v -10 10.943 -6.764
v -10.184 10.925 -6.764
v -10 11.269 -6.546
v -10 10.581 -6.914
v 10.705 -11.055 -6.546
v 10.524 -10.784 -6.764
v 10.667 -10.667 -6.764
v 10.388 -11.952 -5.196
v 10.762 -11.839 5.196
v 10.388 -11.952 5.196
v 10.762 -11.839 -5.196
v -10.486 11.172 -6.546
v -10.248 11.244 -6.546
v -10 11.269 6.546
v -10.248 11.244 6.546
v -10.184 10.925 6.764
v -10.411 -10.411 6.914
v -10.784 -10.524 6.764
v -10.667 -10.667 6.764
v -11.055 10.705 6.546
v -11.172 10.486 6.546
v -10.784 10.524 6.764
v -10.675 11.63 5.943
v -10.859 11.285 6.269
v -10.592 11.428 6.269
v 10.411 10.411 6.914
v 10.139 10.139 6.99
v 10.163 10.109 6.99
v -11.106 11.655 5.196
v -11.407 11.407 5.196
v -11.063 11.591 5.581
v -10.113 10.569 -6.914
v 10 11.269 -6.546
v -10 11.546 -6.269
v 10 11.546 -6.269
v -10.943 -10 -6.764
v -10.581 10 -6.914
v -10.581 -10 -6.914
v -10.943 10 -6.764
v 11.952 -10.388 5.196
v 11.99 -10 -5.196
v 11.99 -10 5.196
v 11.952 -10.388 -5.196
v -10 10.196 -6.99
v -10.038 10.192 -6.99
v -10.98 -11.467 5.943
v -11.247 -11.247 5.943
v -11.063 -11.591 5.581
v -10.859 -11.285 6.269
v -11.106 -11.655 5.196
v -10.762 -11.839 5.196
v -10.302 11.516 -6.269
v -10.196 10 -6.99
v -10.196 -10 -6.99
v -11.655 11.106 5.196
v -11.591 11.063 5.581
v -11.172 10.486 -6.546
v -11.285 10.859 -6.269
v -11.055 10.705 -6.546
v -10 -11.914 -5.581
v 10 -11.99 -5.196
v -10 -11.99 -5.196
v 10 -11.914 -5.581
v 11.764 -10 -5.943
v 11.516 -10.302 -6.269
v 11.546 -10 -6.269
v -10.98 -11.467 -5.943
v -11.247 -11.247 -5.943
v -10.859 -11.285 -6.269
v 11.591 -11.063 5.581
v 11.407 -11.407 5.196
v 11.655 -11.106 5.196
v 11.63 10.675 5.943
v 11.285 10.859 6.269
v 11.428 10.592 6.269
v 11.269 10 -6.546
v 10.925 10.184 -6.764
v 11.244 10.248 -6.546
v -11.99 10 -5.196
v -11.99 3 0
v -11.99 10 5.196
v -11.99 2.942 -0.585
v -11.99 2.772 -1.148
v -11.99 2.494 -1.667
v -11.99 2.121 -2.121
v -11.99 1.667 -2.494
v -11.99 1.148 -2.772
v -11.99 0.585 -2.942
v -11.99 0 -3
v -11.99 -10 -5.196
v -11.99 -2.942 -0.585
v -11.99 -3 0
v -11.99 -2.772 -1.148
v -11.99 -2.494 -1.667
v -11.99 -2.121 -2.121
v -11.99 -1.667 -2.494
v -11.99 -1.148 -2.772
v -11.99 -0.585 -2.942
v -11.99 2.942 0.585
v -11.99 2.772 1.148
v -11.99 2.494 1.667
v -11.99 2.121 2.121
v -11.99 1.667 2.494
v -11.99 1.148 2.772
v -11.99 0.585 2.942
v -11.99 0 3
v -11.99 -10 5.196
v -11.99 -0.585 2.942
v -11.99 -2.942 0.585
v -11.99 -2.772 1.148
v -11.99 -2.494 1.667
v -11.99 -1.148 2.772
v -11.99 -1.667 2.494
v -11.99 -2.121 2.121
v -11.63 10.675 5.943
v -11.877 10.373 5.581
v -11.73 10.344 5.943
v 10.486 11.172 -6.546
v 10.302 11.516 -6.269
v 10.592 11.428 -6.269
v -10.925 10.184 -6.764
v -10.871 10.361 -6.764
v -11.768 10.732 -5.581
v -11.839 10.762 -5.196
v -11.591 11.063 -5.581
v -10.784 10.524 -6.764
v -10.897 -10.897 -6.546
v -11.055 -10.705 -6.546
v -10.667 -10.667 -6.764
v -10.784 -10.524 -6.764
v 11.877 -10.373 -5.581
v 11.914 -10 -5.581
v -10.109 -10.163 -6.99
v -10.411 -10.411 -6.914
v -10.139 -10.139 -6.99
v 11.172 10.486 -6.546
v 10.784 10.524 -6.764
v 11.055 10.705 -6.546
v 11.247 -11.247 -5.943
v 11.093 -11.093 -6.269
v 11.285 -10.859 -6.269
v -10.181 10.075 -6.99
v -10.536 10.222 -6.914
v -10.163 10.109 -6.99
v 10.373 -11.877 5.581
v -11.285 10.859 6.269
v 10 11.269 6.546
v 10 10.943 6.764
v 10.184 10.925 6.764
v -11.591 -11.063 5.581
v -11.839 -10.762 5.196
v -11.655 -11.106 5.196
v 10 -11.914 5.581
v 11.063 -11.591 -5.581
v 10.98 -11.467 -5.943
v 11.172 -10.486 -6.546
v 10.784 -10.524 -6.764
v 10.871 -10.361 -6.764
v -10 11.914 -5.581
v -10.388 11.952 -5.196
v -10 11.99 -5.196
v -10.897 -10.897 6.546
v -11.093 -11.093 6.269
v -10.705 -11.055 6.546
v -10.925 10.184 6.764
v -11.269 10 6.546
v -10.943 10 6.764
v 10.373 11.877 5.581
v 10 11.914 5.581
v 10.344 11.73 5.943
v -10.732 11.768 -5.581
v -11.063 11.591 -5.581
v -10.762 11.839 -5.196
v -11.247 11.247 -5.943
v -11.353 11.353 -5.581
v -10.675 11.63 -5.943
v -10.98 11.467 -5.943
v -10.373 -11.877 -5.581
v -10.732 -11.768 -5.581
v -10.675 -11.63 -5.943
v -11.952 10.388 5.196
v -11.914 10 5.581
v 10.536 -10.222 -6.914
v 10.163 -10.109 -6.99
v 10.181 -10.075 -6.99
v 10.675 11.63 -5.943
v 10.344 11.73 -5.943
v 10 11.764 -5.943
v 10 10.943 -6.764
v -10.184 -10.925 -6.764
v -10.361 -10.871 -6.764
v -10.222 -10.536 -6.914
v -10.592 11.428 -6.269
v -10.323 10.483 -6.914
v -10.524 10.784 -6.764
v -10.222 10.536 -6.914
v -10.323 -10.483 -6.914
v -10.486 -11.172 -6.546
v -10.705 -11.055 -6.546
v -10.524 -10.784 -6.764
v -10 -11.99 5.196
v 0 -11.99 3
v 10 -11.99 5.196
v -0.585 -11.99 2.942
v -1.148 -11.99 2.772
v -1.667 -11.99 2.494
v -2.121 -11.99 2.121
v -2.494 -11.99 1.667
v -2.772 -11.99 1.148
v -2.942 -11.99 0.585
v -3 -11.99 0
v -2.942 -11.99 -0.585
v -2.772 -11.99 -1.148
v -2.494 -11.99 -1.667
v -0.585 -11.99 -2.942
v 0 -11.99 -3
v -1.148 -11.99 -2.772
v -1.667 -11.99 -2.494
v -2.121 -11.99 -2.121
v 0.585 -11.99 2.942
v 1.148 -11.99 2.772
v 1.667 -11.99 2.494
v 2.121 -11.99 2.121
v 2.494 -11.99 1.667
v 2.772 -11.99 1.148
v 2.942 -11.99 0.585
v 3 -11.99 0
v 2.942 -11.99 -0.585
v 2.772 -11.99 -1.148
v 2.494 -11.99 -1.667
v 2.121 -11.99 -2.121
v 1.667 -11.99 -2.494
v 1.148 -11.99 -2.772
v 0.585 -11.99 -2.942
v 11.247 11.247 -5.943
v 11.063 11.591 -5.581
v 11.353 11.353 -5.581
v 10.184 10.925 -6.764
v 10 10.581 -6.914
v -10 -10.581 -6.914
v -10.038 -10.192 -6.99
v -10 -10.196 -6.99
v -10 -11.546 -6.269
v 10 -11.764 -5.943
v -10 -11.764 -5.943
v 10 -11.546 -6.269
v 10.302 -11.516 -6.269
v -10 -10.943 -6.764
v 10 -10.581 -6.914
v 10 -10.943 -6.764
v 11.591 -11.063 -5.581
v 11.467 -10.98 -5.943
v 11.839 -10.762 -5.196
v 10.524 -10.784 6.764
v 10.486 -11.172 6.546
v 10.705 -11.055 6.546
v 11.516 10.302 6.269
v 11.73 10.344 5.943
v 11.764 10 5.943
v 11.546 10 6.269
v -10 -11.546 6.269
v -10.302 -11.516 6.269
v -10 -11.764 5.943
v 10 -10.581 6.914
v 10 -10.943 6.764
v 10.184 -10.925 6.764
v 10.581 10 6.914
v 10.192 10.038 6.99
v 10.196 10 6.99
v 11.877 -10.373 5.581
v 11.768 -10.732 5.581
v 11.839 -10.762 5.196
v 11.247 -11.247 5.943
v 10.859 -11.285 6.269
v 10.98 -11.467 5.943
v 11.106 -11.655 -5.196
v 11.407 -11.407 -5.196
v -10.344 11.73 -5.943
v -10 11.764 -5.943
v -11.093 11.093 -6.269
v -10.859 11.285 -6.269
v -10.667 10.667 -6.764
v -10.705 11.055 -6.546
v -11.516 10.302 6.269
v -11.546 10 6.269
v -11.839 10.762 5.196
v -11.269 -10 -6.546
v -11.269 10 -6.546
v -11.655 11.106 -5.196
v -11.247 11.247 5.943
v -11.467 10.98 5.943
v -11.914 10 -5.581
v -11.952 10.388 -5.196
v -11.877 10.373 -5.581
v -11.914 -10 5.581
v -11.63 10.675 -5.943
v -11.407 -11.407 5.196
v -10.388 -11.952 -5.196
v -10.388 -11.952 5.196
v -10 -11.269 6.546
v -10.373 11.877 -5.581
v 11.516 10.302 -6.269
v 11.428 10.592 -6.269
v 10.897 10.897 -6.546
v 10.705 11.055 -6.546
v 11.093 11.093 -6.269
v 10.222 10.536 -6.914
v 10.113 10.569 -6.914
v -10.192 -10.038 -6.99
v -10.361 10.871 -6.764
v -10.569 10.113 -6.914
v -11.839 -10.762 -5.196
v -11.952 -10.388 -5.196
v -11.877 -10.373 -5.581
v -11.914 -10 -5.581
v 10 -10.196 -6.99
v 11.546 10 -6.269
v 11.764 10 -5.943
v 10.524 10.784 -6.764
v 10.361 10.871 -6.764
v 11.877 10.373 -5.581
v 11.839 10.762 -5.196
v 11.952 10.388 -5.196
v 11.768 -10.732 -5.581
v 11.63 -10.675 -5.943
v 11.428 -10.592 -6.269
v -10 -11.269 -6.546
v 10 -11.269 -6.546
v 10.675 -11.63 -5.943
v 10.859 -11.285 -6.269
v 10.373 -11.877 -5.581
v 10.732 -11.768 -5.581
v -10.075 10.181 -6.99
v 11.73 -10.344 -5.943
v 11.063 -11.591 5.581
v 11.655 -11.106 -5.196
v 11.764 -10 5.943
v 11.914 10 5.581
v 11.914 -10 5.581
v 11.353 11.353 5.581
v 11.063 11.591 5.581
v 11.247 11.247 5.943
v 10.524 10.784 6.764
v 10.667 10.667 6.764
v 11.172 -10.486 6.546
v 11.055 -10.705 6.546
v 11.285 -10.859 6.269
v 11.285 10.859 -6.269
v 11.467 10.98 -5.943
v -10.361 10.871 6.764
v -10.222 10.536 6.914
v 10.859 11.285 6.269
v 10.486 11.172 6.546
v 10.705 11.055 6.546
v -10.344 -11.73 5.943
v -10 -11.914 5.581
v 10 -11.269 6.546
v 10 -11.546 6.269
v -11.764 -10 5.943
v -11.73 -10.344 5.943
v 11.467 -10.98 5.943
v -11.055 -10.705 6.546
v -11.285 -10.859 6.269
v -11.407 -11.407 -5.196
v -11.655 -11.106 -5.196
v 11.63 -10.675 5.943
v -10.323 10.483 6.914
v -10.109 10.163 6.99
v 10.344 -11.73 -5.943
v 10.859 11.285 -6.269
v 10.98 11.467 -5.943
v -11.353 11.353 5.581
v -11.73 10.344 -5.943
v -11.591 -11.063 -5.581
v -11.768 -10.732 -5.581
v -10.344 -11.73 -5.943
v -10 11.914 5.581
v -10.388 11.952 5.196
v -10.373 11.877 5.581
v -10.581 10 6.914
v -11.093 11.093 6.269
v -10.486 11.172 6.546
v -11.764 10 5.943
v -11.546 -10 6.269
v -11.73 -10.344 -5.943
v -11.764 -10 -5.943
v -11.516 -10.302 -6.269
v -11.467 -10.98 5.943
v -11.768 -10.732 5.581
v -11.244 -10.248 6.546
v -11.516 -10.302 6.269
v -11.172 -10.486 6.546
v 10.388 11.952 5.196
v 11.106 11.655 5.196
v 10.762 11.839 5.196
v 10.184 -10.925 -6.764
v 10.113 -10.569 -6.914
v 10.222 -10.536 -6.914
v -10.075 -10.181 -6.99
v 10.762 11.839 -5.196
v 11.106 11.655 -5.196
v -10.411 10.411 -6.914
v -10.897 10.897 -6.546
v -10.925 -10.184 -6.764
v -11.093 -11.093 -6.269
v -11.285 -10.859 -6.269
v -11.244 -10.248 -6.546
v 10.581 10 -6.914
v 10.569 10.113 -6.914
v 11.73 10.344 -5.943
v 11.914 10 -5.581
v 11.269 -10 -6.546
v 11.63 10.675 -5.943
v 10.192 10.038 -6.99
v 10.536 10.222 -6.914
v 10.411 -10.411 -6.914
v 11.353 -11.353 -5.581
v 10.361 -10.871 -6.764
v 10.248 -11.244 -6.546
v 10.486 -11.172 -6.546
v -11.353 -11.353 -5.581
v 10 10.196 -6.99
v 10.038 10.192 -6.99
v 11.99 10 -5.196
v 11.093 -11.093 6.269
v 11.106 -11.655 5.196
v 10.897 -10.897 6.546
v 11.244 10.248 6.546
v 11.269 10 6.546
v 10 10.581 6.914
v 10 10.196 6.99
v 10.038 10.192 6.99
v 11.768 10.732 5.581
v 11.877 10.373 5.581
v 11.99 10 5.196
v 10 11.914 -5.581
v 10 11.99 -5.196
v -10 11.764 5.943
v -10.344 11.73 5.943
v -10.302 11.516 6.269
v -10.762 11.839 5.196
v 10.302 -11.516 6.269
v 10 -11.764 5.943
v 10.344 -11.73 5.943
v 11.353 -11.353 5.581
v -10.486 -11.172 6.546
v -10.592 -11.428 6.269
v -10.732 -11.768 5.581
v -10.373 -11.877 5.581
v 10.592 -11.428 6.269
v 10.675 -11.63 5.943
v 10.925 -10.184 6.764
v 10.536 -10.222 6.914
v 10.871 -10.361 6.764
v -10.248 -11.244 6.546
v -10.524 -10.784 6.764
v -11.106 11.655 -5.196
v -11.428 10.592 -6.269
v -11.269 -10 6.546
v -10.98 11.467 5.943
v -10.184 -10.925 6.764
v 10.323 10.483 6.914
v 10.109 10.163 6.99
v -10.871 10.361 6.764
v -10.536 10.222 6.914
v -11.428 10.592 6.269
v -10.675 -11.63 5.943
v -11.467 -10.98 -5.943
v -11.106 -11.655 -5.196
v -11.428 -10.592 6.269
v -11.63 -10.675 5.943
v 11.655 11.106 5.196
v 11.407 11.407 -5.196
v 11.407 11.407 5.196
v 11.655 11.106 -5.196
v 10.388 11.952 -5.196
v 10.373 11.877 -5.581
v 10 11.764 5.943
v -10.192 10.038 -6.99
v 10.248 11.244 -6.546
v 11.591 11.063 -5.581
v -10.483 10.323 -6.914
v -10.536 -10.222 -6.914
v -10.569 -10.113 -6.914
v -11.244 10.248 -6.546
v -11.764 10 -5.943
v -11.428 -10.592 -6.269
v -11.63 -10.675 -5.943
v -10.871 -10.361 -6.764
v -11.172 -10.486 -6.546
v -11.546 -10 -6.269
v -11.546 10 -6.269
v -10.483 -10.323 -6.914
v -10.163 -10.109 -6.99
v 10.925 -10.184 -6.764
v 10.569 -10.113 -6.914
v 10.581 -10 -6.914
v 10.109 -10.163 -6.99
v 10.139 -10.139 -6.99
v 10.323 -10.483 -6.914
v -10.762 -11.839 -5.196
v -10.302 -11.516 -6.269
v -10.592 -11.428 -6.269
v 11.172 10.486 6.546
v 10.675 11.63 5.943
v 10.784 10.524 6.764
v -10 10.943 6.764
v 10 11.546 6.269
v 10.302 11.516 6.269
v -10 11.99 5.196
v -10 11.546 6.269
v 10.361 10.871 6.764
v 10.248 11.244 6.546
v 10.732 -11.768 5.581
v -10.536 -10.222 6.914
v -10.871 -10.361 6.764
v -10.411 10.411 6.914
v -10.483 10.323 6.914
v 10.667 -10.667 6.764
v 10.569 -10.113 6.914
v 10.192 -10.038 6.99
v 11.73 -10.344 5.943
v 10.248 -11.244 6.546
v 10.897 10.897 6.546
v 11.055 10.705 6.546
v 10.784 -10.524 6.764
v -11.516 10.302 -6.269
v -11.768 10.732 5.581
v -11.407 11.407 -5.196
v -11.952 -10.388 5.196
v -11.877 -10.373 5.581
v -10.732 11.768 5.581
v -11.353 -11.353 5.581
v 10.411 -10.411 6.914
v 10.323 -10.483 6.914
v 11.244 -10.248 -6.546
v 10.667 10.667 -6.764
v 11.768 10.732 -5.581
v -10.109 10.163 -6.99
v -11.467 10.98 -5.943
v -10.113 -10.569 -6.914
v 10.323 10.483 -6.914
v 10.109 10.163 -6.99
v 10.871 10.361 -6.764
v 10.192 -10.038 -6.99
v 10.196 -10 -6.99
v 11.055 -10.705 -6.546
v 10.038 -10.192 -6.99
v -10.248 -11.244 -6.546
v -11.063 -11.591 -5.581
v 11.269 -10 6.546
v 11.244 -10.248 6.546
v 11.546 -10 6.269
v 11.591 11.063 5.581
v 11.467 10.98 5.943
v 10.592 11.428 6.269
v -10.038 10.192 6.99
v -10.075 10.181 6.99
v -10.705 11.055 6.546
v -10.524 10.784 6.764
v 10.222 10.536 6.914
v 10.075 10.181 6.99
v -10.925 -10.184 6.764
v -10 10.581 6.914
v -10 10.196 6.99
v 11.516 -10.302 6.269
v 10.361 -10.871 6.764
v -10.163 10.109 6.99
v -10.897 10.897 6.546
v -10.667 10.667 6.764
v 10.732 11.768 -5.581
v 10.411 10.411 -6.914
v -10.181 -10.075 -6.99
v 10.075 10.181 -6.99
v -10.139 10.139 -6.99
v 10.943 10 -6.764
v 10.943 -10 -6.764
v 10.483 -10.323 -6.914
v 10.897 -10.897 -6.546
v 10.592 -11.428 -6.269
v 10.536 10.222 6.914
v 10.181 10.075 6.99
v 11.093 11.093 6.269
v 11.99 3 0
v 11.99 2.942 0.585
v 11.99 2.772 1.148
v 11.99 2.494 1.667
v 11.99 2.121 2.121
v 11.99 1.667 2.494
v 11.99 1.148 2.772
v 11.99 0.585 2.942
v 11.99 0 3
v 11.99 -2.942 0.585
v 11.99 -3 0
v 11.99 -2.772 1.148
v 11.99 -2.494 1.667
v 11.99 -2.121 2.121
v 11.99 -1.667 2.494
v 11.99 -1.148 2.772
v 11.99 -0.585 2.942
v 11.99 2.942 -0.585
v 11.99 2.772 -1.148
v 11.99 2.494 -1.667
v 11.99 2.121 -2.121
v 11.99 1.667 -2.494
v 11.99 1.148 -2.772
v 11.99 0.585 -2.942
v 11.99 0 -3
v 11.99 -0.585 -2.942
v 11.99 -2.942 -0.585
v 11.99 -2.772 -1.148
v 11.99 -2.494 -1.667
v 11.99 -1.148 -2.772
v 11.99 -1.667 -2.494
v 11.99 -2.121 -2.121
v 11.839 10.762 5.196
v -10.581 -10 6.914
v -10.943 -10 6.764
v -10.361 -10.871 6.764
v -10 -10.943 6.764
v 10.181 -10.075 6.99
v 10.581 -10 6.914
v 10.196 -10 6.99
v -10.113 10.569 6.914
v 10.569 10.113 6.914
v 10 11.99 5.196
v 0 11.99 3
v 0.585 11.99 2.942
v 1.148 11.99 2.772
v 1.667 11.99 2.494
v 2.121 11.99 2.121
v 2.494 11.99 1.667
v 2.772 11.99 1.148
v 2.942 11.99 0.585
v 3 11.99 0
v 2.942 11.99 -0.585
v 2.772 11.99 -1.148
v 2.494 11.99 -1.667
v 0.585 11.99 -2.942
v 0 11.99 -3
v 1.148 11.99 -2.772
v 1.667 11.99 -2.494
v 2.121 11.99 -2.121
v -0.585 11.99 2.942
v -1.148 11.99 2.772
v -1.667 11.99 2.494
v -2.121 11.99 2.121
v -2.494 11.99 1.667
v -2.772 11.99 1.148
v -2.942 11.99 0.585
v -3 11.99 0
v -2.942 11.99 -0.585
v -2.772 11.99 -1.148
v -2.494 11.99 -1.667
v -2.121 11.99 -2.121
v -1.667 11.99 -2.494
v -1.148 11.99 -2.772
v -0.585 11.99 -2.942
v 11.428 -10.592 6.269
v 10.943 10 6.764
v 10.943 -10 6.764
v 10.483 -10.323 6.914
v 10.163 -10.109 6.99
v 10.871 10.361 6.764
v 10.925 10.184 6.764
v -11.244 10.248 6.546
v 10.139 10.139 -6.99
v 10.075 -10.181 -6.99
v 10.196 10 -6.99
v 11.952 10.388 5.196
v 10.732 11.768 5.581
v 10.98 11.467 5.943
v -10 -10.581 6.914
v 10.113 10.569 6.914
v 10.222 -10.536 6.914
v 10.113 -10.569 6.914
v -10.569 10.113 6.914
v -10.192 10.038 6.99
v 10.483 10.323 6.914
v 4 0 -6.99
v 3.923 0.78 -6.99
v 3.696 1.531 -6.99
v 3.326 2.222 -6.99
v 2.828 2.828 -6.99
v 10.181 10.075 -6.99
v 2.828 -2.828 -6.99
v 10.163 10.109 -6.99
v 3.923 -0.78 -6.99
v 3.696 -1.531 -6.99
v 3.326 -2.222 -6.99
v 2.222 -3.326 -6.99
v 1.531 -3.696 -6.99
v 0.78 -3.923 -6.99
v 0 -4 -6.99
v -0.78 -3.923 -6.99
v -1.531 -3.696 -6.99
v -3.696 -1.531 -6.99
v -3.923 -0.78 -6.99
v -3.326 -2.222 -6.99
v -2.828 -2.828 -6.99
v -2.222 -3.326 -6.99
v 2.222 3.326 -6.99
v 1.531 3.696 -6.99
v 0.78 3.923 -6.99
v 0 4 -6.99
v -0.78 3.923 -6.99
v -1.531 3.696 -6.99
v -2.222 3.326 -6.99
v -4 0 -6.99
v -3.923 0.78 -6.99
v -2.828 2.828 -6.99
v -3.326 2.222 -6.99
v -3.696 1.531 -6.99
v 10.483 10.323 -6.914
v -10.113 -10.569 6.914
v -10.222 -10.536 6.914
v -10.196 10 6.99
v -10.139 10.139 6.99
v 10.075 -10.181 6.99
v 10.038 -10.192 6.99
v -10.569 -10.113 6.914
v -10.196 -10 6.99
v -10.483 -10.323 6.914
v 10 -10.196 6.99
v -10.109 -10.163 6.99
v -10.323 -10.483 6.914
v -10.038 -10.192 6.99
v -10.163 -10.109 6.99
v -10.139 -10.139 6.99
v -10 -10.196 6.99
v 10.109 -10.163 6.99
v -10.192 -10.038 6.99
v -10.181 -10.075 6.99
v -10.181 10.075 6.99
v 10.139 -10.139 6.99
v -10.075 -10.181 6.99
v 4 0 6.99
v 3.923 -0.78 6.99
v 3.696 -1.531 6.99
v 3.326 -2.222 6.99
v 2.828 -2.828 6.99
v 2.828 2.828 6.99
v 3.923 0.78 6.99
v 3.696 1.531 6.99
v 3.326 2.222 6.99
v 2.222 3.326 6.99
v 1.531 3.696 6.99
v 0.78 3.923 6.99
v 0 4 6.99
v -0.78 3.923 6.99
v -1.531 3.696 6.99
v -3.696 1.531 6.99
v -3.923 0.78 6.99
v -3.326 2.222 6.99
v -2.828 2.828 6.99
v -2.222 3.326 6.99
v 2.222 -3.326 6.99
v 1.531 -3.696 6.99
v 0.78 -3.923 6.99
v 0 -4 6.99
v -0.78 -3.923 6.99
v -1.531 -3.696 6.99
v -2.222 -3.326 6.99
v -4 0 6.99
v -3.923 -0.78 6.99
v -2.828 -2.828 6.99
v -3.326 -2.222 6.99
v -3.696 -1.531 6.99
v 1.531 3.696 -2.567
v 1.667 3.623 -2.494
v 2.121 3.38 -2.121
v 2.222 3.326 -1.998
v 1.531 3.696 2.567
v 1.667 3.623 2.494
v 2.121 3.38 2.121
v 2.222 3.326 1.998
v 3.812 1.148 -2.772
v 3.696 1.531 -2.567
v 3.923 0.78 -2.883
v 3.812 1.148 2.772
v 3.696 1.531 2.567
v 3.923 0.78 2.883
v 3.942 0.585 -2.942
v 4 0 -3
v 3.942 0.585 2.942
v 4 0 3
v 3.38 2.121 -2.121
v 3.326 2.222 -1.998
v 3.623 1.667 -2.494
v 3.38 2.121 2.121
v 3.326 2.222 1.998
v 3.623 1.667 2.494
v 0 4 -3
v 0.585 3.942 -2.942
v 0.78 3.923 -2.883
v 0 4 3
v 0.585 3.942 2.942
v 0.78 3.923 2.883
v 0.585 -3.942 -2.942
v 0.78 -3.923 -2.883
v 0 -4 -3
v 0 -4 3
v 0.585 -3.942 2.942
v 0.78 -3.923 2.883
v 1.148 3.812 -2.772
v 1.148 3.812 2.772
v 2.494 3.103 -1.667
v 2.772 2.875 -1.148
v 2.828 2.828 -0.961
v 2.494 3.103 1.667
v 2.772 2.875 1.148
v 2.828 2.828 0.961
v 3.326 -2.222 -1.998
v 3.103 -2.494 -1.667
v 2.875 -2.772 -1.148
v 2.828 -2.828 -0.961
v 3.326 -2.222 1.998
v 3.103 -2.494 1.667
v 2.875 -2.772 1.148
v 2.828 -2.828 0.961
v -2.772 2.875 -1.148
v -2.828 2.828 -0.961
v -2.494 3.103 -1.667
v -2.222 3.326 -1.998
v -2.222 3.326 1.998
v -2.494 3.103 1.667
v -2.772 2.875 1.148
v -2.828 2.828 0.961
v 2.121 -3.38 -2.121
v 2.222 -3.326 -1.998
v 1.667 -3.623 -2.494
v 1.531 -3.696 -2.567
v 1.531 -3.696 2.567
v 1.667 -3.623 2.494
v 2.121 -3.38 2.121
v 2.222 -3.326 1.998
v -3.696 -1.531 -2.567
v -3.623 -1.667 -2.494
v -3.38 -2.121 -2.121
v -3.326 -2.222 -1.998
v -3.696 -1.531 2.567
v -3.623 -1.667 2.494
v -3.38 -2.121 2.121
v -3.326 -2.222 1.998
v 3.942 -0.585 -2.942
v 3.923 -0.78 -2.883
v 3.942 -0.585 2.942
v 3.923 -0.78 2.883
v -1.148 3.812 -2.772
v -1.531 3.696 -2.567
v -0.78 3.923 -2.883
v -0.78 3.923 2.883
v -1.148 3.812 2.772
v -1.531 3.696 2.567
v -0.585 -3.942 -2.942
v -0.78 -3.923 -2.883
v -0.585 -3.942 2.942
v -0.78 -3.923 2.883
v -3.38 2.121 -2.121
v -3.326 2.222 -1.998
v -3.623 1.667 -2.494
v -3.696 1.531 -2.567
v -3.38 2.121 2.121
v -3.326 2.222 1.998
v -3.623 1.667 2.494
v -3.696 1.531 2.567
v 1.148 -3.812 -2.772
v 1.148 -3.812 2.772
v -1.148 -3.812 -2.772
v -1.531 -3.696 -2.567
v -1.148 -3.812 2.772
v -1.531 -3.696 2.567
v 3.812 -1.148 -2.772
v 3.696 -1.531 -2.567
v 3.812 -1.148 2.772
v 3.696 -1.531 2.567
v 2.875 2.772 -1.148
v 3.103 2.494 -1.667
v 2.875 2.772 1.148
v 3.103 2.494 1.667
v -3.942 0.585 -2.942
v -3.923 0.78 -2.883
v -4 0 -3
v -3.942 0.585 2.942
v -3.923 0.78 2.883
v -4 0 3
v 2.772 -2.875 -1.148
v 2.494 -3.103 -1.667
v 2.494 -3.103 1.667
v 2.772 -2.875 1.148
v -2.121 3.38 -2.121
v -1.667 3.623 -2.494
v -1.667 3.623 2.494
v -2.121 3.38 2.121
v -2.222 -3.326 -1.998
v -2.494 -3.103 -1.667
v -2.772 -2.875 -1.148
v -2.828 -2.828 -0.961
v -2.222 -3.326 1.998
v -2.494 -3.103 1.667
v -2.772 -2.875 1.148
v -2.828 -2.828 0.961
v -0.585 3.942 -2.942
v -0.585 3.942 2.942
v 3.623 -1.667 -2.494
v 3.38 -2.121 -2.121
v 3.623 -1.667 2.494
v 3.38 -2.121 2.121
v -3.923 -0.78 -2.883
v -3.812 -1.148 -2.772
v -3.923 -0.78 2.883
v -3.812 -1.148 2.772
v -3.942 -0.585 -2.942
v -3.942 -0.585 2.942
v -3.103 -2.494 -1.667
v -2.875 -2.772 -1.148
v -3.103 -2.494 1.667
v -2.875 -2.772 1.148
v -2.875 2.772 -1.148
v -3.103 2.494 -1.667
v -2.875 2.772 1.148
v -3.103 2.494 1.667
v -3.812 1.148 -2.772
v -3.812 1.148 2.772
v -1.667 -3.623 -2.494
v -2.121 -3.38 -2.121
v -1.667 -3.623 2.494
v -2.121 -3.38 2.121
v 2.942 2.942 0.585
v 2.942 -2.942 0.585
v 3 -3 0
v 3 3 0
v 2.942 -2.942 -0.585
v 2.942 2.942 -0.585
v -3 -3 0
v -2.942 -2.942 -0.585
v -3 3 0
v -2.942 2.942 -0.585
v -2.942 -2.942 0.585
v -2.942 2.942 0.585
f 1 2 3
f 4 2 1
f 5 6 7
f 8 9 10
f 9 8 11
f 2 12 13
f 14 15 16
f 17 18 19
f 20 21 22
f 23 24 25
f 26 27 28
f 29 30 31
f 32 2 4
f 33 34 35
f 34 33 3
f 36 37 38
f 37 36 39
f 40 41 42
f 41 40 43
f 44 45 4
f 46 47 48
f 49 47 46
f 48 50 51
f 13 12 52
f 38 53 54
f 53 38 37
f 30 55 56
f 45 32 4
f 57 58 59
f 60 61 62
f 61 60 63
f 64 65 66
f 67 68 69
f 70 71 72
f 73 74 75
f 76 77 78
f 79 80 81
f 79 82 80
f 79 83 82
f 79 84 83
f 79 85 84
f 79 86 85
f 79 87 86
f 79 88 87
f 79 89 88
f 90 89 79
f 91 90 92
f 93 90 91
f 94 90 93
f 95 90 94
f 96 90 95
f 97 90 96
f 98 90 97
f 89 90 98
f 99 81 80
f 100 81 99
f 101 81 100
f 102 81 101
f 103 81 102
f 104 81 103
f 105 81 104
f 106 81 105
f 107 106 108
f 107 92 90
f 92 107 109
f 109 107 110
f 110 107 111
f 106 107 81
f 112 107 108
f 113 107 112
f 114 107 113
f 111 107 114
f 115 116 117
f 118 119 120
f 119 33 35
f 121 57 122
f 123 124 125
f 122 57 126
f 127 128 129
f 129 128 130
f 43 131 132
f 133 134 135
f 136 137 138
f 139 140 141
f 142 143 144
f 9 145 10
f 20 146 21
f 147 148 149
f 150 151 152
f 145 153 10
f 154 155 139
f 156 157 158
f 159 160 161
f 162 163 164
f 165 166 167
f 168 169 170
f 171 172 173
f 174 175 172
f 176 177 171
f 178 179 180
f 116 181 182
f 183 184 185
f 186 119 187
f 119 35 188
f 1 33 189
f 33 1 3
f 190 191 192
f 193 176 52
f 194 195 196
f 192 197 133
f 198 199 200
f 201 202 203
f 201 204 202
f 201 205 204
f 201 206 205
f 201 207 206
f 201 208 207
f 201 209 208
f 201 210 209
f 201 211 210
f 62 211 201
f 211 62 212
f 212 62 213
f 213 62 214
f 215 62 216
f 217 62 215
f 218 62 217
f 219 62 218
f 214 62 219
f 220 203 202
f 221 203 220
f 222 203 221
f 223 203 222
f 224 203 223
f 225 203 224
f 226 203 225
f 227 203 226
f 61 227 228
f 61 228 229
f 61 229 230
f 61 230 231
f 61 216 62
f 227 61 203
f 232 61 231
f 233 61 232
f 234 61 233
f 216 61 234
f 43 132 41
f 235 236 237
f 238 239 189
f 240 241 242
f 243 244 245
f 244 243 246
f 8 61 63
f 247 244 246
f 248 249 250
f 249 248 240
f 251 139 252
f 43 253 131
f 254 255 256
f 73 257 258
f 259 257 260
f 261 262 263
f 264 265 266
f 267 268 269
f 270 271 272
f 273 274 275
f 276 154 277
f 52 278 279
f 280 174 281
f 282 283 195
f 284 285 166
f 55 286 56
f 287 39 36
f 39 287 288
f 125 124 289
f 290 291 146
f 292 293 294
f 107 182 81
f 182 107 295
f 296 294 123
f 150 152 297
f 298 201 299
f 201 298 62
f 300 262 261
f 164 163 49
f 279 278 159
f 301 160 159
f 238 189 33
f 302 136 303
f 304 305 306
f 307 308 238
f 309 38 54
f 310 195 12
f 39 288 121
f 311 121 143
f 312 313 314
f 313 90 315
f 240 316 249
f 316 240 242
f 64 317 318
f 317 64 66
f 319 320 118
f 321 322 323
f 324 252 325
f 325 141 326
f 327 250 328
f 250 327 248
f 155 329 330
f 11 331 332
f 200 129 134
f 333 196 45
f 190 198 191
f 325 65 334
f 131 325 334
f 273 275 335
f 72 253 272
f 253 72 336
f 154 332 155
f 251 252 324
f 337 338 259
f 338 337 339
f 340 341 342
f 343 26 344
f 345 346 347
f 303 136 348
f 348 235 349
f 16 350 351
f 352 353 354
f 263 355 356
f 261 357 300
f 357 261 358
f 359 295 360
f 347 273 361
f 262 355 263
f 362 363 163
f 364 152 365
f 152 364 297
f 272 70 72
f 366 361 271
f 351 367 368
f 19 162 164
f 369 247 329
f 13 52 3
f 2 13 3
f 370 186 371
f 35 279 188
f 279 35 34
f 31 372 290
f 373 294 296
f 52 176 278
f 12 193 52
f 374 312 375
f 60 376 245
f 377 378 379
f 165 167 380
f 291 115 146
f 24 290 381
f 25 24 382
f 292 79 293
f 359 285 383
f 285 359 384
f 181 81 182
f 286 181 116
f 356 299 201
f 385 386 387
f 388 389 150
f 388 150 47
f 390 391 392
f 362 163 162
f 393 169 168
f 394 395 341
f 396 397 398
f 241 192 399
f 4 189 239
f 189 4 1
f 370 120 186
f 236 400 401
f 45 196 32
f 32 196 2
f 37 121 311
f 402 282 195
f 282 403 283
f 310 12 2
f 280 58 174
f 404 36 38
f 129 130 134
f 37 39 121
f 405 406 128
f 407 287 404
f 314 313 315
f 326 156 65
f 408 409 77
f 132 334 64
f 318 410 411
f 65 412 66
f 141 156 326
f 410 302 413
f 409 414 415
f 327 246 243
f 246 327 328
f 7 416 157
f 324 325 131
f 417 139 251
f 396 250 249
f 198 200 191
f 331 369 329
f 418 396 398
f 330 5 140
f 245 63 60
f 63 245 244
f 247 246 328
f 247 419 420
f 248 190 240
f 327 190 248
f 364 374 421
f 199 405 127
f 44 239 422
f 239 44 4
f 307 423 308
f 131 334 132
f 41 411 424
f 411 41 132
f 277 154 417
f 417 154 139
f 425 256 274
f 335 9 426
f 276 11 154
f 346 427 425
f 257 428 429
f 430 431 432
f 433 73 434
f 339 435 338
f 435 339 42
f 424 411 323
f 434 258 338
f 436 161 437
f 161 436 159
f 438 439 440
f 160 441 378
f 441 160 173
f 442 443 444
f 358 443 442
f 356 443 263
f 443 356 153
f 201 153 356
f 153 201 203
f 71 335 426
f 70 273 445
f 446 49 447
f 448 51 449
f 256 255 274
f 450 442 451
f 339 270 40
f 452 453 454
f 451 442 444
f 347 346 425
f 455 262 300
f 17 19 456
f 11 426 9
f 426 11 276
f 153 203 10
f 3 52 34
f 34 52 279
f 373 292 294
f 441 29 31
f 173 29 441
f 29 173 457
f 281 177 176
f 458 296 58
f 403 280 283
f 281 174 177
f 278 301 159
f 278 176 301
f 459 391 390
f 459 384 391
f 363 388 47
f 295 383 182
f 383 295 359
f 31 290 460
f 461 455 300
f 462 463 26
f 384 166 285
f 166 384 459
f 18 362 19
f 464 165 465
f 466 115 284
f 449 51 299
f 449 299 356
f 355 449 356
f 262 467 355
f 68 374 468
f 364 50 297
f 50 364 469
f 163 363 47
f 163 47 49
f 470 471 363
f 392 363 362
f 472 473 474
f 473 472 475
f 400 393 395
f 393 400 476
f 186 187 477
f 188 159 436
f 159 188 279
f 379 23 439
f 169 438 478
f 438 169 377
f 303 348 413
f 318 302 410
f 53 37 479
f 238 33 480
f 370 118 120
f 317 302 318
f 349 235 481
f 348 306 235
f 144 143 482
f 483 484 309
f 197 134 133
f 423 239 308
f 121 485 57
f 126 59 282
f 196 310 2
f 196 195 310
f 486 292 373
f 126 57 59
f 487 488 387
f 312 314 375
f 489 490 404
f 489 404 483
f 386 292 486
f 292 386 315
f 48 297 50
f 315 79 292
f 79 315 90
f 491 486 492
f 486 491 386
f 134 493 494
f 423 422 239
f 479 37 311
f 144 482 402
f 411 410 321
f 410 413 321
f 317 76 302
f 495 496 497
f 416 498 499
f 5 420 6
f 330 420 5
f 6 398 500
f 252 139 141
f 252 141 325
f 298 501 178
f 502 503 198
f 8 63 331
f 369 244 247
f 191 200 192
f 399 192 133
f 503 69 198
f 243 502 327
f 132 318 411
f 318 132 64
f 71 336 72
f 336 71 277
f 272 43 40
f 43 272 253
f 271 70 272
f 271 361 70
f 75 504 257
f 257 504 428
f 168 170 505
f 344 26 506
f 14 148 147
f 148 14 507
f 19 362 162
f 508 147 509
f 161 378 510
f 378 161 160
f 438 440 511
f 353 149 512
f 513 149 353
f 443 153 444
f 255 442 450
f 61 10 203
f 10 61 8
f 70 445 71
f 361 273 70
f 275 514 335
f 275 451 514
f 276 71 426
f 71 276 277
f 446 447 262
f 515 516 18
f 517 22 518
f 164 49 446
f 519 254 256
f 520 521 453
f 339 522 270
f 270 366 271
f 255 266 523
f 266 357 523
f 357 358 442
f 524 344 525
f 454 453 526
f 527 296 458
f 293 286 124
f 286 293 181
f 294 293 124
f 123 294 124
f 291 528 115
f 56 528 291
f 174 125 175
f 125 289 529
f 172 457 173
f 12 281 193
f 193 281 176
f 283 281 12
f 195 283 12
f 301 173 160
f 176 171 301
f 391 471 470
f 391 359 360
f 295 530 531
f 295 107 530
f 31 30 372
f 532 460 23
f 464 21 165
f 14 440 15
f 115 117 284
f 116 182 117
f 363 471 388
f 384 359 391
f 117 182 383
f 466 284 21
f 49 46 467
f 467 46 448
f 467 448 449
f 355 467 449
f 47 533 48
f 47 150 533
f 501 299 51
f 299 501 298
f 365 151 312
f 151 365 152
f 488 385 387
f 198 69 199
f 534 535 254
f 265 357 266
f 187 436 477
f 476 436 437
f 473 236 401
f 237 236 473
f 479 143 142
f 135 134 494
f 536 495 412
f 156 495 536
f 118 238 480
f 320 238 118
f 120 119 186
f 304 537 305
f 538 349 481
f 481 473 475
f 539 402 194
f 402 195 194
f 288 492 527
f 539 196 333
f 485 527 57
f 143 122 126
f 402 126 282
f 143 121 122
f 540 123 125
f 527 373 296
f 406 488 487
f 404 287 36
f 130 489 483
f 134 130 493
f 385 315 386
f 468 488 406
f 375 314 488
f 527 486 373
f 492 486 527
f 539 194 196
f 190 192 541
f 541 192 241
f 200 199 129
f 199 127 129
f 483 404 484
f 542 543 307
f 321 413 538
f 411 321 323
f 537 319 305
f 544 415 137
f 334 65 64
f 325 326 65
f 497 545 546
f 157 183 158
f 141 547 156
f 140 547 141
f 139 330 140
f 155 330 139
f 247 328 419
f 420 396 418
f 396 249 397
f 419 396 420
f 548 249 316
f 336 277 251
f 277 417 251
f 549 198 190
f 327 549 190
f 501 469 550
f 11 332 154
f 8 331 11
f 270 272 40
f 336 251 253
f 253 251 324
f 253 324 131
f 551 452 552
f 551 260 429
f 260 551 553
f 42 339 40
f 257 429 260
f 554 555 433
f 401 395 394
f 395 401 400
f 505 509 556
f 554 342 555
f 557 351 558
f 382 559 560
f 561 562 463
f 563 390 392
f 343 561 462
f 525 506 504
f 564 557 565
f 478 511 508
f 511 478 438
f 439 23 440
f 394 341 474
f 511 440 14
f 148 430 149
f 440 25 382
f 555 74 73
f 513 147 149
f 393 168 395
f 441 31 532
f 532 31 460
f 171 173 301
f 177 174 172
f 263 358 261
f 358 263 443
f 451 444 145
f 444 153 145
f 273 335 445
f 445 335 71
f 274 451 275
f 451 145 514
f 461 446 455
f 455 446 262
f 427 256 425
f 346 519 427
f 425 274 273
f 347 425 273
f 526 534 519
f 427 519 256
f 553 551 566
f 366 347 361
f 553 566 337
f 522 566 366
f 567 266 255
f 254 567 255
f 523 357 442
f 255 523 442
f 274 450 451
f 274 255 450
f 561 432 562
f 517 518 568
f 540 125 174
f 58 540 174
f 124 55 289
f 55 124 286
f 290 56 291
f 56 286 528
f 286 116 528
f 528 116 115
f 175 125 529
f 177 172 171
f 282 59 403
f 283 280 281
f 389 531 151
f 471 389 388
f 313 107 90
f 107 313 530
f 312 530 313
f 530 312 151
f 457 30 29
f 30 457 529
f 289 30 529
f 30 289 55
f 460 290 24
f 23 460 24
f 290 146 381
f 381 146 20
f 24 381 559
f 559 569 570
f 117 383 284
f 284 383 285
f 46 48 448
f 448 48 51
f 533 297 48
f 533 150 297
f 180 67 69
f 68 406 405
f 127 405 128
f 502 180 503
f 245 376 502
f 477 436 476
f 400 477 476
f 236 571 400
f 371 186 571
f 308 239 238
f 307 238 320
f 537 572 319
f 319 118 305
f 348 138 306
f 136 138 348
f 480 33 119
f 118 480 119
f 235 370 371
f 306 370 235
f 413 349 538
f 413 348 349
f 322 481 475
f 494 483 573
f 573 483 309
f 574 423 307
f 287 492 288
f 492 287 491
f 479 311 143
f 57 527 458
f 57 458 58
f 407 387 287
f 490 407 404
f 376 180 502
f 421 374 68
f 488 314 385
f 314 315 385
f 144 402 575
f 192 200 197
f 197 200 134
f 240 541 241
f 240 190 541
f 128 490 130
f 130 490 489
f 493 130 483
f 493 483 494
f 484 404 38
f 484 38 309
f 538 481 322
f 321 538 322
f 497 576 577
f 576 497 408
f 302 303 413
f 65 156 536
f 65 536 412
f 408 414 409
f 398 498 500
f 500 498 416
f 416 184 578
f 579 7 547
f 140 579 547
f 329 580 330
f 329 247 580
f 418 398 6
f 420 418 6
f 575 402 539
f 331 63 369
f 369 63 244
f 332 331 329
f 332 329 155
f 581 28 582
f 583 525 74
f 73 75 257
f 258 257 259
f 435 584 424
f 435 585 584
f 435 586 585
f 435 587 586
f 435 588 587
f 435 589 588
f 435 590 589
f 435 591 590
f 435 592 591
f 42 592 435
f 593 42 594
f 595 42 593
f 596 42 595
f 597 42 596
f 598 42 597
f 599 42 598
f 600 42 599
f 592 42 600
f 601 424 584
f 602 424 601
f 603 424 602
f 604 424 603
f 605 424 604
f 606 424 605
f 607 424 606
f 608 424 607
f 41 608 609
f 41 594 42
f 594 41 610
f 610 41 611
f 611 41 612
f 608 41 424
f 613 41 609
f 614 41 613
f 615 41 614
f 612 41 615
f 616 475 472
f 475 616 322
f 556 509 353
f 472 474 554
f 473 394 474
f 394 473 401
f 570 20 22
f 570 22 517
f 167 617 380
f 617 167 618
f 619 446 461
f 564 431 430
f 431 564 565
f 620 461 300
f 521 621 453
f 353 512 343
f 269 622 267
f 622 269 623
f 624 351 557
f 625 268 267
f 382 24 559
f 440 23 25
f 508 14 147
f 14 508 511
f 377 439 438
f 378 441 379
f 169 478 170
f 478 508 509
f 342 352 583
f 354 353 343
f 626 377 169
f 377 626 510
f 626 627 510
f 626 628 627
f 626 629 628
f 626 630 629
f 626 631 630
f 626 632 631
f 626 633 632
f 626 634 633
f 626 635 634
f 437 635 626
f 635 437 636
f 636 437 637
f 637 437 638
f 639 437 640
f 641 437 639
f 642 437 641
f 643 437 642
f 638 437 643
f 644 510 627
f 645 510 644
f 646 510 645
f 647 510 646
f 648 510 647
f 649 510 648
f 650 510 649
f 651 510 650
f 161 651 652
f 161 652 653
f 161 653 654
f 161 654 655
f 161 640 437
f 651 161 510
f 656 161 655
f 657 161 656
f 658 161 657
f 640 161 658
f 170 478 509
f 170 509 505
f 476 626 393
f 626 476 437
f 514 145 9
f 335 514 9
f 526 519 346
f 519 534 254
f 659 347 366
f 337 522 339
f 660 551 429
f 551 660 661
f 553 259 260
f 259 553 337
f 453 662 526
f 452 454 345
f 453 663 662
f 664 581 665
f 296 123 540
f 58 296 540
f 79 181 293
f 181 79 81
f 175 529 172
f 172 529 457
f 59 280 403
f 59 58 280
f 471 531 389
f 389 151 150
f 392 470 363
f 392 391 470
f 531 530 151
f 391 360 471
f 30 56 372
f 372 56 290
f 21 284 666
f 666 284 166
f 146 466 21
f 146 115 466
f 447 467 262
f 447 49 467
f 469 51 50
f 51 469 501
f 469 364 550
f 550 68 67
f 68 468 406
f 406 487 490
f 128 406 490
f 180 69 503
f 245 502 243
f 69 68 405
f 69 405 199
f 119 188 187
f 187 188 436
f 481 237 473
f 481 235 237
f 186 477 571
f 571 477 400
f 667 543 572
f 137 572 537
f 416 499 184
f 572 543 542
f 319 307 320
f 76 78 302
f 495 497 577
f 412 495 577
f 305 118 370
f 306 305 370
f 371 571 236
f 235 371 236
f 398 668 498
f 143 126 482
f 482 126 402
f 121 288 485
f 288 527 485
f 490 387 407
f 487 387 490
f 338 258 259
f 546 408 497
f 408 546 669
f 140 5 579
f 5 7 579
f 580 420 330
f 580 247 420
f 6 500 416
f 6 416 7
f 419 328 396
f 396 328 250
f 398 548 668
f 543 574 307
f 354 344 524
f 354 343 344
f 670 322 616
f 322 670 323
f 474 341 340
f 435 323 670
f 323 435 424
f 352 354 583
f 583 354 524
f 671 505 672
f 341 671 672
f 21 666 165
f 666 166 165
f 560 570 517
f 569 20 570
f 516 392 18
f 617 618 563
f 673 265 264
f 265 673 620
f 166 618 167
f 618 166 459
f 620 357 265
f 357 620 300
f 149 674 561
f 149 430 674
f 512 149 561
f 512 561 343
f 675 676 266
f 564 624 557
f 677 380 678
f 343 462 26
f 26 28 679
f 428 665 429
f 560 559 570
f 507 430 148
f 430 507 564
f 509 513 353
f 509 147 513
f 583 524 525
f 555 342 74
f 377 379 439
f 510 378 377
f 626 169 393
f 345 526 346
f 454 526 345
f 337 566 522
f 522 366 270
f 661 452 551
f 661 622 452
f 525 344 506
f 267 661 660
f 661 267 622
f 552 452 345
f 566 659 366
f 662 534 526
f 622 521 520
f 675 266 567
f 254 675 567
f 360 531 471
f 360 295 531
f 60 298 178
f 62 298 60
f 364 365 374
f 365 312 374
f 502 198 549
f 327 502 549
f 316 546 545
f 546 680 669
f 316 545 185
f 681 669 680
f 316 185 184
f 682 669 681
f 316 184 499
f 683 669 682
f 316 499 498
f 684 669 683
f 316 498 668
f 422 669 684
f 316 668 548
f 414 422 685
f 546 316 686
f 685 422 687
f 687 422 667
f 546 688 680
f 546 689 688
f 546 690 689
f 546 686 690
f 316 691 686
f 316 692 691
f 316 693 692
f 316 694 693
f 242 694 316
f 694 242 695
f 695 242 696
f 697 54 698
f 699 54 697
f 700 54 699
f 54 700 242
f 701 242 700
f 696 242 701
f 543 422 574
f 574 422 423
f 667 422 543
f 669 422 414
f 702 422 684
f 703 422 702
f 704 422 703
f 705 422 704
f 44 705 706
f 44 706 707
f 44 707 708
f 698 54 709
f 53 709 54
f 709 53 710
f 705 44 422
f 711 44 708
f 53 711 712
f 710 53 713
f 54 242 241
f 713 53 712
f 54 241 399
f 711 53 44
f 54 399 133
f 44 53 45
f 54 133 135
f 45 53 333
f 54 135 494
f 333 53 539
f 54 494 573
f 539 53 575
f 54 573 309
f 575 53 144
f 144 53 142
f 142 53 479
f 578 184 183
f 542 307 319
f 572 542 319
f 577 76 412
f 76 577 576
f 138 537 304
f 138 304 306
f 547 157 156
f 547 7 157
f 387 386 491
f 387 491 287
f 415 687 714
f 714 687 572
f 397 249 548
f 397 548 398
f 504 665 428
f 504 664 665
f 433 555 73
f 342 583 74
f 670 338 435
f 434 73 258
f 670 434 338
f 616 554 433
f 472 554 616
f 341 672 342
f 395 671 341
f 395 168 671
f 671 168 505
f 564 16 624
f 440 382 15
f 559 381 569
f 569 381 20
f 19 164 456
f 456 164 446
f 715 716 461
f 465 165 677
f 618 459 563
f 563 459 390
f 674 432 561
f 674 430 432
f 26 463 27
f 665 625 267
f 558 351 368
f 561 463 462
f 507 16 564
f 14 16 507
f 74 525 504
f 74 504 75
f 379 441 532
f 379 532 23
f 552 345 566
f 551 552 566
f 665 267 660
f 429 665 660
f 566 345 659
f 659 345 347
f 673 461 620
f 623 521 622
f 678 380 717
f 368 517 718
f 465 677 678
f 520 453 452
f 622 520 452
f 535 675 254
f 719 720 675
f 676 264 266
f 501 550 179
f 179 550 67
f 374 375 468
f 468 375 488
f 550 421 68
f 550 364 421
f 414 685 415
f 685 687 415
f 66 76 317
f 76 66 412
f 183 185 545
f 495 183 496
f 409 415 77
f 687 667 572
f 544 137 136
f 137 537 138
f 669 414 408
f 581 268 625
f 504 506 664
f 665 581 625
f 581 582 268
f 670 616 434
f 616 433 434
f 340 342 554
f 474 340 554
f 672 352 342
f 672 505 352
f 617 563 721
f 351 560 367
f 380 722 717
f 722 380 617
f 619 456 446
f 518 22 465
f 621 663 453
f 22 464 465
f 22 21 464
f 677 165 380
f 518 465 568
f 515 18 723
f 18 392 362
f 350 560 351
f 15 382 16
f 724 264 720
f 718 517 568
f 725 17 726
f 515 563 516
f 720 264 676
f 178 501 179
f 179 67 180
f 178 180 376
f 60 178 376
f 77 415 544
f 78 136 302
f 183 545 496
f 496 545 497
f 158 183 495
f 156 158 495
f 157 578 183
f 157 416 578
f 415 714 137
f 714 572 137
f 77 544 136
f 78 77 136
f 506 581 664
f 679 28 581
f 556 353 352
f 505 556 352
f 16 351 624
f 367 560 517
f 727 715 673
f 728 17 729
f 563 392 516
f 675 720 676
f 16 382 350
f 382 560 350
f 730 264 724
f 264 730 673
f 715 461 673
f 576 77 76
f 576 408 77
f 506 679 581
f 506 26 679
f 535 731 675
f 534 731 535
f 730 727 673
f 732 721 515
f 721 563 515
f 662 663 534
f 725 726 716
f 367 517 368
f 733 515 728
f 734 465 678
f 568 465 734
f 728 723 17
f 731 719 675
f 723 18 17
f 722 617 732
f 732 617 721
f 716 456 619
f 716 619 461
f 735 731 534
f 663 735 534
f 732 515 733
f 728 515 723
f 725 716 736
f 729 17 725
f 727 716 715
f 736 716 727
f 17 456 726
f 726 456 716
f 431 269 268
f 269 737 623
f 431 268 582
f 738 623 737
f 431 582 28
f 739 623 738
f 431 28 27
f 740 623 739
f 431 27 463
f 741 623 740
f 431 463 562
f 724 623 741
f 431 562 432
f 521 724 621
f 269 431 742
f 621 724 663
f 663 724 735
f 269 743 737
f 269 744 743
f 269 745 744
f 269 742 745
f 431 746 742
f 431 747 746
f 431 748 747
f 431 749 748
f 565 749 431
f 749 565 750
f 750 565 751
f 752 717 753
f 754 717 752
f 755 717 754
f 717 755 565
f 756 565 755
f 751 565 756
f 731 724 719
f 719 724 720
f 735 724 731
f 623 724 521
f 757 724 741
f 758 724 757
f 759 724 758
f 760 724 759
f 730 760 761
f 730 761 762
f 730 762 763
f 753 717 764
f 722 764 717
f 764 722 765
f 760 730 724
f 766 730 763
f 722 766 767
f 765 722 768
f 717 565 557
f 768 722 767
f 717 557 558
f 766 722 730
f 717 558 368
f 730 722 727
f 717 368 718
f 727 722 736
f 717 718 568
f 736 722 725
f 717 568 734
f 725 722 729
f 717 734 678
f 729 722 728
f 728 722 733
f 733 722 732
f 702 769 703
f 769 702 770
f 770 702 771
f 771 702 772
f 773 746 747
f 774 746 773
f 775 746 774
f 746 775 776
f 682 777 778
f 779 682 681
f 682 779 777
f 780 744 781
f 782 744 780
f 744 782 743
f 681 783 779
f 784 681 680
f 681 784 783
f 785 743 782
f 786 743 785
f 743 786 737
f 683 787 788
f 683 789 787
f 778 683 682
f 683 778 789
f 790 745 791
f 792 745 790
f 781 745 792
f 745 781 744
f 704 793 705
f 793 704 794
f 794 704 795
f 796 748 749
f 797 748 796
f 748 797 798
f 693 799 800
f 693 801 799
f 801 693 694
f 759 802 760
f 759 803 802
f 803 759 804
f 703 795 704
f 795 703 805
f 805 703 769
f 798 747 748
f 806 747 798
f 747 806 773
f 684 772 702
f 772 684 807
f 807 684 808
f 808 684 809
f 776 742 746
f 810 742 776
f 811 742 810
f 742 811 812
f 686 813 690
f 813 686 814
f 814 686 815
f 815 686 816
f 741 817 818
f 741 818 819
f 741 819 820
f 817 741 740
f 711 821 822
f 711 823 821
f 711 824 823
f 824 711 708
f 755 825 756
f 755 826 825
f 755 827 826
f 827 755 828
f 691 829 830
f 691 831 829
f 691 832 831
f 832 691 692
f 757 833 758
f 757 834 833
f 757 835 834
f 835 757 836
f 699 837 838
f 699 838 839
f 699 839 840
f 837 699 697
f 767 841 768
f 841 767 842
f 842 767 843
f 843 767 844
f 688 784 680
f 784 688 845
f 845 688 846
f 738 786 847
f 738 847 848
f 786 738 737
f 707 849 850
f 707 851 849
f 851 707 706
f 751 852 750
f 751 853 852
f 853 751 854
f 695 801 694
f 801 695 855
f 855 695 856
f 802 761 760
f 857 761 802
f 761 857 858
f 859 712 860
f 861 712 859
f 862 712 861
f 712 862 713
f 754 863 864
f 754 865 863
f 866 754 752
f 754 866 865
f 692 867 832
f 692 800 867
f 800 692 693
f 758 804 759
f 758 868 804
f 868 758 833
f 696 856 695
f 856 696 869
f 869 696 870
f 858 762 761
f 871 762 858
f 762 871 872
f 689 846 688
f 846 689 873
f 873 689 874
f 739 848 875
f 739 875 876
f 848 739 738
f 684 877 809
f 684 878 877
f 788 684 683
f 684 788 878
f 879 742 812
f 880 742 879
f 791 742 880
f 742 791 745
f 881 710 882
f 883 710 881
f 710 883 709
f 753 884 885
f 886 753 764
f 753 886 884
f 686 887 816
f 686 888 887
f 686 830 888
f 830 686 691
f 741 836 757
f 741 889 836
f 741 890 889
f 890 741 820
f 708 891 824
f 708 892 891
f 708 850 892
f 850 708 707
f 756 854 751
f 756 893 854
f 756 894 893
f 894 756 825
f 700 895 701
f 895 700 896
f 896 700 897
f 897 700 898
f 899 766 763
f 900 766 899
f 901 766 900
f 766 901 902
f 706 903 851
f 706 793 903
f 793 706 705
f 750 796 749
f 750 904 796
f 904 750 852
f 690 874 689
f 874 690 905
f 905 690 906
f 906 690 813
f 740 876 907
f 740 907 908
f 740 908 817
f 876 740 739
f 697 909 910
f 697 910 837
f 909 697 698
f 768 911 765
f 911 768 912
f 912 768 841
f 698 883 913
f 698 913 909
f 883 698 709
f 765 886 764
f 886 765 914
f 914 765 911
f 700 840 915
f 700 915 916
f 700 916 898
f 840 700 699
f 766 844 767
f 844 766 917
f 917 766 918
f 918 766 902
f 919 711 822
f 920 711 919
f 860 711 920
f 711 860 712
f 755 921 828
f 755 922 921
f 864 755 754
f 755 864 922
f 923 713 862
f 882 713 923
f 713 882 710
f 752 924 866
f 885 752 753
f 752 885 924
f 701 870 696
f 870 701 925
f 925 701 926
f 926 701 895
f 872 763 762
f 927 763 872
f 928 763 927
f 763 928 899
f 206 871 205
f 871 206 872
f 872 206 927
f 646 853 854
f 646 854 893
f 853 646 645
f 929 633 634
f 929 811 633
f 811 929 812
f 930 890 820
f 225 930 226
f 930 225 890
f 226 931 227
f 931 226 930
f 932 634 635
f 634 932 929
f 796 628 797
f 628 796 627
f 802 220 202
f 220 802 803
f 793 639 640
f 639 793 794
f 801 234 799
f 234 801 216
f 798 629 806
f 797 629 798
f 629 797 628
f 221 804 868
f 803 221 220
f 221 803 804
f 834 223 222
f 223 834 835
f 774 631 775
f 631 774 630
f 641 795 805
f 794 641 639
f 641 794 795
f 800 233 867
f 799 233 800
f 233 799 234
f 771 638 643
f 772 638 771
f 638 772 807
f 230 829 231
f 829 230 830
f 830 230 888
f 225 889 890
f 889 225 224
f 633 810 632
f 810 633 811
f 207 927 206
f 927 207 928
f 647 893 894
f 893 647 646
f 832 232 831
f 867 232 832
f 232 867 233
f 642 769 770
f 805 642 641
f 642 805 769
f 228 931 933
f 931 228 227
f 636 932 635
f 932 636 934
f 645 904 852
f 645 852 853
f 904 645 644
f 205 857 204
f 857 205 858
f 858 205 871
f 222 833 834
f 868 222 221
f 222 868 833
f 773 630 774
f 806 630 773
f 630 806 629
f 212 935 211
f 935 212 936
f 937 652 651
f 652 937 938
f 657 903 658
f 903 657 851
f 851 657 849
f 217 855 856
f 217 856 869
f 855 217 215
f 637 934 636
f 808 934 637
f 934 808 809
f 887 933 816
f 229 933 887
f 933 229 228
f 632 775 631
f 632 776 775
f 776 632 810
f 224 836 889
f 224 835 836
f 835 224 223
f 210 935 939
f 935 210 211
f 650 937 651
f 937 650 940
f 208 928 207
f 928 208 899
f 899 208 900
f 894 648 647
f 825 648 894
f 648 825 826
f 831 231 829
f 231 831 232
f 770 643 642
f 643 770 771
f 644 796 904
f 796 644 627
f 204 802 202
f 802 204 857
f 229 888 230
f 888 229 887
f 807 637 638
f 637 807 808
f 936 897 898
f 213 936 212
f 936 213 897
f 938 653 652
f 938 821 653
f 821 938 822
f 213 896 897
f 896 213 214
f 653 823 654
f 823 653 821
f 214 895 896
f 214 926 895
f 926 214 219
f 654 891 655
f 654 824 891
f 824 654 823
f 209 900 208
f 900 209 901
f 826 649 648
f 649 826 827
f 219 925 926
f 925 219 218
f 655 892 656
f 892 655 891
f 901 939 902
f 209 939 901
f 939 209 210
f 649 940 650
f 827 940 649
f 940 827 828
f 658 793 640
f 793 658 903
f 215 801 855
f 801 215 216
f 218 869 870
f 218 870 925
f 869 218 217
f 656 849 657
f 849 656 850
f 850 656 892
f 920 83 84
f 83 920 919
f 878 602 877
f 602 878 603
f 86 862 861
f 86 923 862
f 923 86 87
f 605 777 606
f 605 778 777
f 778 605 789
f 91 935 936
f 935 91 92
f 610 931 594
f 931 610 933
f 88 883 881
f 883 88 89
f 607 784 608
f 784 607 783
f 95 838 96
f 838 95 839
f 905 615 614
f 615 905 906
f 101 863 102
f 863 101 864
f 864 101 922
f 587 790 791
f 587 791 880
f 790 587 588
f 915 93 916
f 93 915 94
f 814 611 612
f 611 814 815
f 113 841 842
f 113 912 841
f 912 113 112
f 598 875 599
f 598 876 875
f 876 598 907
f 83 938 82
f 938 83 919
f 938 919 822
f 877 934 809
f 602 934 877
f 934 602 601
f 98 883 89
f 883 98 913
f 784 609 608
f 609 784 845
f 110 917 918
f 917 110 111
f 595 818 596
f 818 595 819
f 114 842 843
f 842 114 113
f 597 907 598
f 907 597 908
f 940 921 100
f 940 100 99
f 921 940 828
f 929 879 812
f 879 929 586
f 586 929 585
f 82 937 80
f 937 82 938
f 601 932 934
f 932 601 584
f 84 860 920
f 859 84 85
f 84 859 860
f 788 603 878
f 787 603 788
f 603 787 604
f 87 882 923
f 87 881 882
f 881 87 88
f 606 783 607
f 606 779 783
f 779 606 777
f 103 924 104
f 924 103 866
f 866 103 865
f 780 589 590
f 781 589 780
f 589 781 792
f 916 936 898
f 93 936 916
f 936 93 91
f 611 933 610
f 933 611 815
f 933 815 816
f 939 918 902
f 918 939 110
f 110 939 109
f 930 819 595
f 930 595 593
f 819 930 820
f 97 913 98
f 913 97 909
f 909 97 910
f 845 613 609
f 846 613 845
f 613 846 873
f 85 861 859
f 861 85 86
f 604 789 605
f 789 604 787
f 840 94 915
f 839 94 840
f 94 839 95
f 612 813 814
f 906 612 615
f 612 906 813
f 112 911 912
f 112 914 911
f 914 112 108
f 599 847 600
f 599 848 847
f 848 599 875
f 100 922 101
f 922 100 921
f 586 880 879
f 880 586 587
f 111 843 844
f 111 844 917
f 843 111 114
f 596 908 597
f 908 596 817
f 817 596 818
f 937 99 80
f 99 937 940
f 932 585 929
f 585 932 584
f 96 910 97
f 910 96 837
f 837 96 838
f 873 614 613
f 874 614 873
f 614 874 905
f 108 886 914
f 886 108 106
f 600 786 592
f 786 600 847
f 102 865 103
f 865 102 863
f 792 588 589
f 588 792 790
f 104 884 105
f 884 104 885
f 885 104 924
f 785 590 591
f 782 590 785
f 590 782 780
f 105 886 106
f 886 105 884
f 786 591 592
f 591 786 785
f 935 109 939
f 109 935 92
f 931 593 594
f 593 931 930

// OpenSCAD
// Example OpenSCAD file — a rounded cube with cylindrical holes
// Run: npx openscad-viewer samples/example.scad

$fn = 32;

difference() {
    // Rounded base block
    minkowski() {
        cube([20, 20, 10], center = true);
        sphere(r = 2);
    }

    // Hole through the top
    cylinder(h = 20, r = 4, center = true);

    // Hole through the front
    rotate([90, 0, 0])
        cylinder(h = 30, r = 3, center = true);

    // Hole through the side
    rotate([0, 90, 0])
        cylinder(h = 30, r = 3, center = true);
}
